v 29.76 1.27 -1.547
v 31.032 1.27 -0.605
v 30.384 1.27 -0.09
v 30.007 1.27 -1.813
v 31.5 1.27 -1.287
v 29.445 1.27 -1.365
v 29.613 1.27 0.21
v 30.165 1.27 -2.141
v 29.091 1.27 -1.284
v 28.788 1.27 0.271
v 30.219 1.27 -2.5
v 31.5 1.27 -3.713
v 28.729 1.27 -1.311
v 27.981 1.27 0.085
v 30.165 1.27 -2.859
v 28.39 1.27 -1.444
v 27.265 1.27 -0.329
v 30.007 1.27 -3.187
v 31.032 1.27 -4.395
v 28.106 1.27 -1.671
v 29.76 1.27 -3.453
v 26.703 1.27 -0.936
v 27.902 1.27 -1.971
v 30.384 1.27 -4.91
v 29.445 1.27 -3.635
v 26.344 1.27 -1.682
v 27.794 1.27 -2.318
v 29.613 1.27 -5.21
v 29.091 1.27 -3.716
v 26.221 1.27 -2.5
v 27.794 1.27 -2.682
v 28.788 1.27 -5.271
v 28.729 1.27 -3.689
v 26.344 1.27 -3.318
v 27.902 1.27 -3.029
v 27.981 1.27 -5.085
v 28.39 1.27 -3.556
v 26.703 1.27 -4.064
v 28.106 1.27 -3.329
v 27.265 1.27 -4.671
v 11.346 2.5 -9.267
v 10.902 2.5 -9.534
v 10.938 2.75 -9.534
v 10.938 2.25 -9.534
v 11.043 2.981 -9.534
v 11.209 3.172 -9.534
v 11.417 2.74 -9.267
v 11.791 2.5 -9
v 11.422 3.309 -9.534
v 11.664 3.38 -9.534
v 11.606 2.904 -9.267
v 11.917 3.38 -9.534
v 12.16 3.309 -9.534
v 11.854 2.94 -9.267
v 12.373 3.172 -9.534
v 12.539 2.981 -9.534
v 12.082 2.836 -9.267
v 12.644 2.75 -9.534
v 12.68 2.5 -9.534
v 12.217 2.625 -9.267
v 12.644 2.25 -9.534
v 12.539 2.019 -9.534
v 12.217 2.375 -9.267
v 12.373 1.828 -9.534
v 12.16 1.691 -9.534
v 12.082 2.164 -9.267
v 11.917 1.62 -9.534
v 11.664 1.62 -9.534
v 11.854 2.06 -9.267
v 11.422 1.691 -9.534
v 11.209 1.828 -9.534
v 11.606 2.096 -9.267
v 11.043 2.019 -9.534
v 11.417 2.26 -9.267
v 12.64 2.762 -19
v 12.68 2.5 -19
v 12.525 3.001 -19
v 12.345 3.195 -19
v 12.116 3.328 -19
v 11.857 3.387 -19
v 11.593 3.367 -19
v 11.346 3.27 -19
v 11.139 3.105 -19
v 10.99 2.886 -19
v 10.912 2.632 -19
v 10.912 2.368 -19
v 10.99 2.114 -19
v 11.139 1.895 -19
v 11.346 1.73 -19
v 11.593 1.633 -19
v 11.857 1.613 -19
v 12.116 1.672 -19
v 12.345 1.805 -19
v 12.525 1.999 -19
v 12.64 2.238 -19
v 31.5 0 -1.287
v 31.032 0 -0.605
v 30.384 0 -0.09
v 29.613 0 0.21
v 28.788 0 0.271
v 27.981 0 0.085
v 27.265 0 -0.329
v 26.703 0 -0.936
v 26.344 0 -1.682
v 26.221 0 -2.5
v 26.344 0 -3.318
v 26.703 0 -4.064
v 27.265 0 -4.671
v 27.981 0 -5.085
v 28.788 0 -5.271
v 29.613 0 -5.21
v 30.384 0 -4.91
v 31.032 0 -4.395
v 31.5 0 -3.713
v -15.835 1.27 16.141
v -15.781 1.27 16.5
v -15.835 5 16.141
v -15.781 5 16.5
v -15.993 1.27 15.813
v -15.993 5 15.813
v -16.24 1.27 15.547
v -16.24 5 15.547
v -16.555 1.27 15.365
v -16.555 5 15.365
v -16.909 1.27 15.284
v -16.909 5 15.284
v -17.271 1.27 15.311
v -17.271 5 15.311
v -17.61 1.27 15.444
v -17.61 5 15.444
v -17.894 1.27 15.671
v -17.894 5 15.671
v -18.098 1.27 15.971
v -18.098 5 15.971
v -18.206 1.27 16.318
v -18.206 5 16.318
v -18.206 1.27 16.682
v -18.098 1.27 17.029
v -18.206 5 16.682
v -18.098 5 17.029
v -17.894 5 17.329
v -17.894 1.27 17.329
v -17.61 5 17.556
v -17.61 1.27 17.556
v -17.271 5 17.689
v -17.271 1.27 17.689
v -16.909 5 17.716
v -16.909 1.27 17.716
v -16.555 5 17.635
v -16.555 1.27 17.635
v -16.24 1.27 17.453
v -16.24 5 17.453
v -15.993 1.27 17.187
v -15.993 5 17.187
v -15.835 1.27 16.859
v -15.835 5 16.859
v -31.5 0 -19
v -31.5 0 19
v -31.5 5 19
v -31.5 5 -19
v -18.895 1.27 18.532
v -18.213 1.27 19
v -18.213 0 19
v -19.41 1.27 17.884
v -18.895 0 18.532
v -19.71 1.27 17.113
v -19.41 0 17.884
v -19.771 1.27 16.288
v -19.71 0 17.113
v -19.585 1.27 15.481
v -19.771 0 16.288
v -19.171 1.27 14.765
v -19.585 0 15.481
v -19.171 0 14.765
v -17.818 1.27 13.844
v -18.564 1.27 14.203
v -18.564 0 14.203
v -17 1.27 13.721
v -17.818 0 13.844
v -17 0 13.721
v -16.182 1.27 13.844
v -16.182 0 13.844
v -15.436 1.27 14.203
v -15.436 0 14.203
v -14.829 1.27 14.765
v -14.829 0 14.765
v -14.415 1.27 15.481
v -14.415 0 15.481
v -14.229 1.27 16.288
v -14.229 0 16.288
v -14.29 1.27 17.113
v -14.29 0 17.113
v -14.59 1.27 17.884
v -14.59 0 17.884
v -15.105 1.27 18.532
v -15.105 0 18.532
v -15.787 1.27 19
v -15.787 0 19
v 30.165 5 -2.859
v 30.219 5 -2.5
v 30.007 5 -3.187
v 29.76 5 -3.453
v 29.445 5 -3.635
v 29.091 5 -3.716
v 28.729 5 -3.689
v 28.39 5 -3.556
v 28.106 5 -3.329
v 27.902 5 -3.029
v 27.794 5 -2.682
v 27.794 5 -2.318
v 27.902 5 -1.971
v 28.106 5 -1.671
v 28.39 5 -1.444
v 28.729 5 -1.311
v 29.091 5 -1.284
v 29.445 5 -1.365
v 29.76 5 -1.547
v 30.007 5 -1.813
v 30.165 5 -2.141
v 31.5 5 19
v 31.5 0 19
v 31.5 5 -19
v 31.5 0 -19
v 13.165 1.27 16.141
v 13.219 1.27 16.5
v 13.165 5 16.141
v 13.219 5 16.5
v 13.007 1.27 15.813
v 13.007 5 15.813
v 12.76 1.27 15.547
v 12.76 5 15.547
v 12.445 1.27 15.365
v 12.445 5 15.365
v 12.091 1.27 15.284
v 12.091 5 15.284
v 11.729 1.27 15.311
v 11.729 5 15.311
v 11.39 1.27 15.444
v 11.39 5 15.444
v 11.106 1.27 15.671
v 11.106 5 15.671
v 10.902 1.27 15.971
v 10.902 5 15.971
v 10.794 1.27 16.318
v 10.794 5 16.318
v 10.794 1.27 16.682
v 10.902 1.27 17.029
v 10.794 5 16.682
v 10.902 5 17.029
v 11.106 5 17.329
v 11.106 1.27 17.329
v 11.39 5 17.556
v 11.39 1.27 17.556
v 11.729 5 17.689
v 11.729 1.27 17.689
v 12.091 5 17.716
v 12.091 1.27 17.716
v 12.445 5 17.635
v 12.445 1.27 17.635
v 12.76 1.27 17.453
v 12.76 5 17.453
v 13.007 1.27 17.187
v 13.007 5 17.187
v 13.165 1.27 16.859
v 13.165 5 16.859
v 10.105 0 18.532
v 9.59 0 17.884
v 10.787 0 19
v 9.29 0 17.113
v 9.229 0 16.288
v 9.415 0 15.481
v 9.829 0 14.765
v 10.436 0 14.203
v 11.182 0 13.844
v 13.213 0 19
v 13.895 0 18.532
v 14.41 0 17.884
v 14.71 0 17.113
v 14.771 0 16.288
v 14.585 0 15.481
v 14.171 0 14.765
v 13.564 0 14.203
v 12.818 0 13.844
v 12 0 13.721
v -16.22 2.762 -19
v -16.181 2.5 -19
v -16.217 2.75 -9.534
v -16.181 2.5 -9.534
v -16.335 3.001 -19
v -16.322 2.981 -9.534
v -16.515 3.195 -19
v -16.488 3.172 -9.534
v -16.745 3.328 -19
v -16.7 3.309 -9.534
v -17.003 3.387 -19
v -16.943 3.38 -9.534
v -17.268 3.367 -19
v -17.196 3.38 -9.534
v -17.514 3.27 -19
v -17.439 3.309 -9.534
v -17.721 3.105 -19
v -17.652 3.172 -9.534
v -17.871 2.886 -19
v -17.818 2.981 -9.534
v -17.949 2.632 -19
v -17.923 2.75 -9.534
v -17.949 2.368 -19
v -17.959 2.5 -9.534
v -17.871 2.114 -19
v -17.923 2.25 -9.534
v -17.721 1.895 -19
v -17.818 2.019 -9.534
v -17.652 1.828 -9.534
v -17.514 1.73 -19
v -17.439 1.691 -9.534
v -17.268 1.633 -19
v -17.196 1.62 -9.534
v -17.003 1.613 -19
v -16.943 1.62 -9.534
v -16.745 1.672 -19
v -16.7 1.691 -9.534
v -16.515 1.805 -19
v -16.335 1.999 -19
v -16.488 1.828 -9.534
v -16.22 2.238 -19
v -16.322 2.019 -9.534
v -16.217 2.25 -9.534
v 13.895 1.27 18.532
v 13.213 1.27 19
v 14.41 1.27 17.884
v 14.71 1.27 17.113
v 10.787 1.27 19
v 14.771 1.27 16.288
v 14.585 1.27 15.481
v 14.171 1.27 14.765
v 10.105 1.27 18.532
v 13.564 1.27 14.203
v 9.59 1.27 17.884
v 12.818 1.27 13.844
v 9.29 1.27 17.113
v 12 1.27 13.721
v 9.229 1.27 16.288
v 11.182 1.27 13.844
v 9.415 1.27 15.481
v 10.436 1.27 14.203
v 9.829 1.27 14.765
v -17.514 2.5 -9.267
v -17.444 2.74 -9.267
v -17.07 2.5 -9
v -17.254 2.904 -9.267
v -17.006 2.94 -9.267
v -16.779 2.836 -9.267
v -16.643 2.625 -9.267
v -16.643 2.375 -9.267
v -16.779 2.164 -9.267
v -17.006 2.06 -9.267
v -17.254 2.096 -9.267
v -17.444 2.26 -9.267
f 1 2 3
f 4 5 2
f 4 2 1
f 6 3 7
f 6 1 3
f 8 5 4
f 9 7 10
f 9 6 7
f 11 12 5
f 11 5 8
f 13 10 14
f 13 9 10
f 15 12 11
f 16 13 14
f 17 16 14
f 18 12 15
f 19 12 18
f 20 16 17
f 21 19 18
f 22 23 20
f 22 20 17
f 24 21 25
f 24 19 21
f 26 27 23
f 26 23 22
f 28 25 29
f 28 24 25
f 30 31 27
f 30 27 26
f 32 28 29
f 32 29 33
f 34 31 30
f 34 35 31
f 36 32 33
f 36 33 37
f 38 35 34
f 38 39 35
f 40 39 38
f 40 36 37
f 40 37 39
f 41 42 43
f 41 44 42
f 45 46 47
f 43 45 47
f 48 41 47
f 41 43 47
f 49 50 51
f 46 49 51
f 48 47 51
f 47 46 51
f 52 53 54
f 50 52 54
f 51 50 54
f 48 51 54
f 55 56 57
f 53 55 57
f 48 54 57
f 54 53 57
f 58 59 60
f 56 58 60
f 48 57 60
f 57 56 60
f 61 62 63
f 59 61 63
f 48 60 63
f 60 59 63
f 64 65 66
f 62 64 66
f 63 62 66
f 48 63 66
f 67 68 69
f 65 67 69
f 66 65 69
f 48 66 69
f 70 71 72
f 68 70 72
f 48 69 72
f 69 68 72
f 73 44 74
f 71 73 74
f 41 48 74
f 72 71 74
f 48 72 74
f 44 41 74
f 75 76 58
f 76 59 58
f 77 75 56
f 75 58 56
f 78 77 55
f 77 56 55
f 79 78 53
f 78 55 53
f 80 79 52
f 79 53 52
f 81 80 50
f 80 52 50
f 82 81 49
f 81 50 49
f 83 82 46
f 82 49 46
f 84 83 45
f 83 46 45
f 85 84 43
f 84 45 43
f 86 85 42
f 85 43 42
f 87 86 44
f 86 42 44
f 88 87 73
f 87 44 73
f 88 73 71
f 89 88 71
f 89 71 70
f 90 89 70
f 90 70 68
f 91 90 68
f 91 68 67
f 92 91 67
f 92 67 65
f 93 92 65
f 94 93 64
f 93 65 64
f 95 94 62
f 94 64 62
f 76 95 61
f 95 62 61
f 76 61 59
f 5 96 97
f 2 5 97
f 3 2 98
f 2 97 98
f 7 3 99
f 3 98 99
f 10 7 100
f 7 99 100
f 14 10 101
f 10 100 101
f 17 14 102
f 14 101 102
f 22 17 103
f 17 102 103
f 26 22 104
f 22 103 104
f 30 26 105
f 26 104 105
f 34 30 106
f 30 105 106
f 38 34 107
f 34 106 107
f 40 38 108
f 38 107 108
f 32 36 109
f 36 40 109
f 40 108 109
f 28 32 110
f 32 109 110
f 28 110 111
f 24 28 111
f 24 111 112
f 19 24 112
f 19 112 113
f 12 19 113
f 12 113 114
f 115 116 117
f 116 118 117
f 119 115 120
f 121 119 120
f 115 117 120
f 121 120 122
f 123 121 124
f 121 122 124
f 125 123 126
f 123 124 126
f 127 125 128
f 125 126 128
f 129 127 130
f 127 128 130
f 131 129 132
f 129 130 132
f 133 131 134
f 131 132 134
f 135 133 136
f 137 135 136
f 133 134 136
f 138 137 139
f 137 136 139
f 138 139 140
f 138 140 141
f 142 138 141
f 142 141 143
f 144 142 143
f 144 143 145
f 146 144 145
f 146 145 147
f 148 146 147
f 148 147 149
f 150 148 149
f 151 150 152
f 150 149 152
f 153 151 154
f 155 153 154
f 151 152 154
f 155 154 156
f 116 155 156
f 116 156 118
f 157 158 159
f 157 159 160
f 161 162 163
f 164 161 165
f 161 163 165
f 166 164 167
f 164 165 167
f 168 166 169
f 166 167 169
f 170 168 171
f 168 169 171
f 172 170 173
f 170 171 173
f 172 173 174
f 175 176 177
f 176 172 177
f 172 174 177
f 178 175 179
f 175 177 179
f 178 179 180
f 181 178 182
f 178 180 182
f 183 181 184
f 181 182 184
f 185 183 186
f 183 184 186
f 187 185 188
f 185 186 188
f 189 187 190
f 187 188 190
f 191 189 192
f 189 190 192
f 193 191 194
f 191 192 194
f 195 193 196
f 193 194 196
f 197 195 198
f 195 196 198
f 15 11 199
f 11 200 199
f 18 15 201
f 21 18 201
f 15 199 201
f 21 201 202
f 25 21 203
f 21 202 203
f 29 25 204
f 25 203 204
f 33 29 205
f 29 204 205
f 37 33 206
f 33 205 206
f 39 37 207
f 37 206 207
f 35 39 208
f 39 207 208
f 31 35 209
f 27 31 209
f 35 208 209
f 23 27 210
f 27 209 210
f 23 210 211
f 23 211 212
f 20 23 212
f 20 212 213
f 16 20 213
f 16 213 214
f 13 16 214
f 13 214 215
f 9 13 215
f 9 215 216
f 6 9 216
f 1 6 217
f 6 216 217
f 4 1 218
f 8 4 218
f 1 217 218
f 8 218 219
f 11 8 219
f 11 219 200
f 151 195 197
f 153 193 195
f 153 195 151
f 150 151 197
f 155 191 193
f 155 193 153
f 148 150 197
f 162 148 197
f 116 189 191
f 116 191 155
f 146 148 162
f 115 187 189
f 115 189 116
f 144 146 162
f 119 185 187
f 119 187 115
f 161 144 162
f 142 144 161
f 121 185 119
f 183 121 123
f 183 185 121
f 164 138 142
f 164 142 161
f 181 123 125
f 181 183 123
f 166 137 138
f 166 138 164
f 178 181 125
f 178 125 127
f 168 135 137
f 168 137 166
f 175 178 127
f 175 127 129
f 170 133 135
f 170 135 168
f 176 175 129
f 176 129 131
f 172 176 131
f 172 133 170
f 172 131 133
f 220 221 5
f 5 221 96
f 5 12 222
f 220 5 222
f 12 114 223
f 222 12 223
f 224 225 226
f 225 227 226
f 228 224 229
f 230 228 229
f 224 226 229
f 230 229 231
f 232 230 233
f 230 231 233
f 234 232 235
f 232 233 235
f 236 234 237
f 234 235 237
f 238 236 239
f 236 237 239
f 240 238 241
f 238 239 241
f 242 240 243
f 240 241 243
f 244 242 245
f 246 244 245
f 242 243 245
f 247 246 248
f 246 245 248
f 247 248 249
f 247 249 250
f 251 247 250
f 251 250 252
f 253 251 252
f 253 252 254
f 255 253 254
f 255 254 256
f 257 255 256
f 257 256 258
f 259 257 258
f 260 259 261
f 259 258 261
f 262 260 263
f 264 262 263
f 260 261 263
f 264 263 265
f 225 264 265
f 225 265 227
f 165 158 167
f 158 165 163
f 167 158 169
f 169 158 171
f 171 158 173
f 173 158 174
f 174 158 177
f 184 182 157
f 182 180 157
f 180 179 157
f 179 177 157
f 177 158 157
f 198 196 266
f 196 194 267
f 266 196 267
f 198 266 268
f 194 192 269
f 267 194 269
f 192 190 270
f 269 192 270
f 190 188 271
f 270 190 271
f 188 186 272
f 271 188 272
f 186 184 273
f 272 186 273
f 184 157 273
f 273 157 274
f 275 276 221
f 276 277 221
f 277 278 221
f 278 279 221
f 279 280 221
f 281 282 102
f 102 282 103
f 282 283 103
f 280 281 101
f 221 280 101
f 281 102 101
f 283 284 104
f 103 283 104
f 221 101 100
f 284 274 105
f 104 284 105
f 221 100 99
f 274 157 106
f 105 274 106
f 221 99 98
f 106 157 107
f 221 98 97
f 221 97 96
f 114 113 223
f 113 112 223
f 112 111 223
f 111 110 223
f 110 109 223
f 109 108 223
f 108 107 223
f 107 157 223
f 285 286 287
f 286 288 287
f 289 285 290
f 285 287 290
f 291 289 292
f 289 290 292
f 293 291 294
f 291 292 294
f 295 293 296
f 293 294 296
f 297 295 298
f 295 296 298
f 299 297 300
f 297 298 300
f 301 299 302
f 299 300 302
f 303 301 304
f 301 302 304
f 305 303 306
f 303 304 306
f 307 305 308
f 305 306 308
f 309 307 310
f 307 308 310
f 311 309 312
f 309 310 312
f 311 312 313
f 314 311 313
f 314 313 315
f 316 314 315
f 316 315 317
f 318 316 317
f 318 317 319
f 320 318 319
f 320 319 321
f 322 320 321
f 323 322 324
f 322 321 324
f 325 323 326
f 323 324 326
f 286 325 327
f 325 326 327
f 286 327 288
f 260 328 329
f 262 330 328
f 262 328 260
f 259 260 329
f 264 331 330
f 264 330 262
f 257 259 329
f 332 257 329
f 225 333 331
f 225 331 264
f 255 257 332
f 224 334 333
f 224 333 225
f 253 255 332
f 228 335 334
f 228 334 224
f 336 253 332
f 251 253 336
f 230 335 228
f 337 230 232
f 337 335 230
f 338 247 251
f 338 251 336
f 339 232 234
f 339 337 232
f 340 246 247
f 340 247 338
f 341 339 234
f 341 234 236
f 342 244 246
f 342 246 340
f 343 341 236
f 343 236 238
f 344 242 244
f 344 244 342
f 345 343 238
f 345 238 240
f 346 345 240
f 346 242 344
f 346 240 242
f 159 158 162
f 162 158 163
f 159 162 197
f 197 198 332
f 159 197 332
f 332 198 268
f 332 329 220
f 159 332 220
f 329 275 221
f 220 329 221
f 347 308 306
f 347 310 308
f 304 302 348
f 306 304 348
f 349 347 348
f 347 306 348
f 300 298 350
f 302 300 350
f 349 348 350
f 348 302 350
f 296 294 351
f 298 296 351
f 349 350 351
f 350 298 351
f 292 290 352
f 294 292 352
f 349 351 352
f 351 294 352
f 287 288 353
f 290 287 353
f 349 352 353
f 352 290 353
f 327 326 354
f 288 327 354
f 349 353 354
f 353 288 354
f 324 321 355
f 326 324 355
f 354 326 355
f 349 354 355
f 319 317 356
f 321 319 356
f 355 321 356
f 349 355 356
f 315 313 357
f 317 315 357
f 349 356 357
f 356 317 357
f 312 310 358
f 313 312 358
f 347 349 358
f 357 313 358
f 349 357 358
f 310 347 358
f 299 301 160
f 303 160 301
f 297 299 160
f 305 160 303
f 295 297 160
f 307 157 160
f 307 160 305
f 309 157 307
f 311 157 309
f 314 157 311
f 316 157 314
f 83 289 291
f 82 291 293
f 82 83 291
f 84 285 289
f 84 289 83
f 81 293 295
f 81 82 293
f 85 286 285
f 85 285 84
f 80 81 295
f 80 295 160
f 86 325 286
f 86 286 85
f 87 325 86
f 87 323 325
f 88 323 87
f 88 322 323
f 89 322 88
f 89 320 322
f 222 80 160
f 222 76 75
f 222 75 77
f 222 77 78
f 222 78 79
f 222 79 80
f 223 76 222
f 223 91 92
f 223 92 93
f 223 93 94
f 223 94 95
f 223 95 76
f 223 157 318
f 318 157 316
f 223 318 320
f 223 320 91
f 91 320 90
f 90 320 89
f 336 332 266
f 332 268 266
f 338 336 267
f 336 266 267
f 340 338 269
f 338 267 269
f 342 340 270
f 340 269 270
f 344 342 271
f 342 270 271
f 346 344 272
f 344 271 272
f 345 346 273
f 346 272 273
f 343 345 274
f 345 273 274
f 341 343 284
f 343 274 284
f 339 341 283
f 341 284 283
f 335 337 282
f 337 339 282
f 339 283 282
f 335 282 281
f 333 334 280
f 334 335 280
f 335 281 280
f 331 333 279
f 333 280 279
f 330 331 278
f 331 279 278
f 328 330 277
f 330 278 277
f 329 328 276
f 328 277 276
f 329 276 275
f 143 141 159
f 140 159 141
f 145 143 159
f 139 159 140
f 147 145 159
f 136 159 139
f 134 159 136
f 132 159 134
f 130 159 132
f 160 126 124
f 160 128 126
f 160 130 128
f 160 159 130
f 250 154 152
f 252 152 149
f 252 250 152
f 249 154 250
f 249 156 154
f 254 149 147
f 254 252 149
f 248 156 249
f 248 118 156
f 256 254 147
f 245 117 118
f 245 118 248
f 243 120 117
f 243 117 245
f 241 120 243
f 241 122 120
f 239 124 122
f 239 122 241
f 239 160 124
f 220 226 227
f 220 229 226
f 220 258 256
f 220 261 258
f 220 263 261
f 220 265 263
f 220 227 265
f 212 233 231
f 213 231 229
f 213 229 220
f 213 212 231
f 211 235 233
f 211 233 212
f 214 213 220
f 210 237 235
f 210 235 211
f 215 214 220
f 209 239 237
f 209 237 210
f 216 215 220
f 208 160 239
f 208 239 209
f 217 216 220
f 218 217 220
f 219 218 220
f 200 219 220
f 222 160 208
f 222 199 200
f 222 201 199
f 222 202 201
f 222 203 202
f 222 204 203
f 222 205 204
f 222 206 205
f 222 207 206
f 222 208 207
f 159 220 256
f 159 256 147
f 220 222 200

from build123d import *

# Parameters (mm, degrees)
SKETCH1_W                                           = 63
SKETCH1_H                                           = 38
BOSS_EXTRUDE1_DEPTH                                 = 5
CBORE_FOR_2_BINDING_HEAD_MACHINE_SCREW2_D           = 2.4384
CBORE_FOR_2_BINDING_HEAD_MACHINE_SCREW2_CBORE_D     = 5.55752
CBORE_FOR_2_BINDING_HEAD_MACHINE_SCREW2_CBORE_DEPTH = 1.27
CBORE_FOR_2_BINDING_HEAD_MACHINE_SCREW3_D           = 2.4384
CBORE_FOR_2_BINDING_HEAD_MACHINE_SCREW3_CBORE_D     = 5.55752
CBORE_FOR_2_BINDING_HEAD_MACHINE_SCREW3_CBORE_DEPTH = 1.27
F_2_56_TAPPED_HOLE1_D                               = 1.778
F_2_56_TAPPED_HOLE1_DEPTH                           = 9.46583491
F_2_56_TAPPED_HOLE1_TIP                             = 0.53416509


with BuildPart() as part:
    # Sketch1 → Boss-Extrude1 (new body)
    with BuildSketch(Plane(origin=(0, 0, 0), x_dir=(1, 0, 0), z_dir=(0, 1, 0))):
        Rectangle(SKETCH1_W, SKETCH1_H)
    extrude(amount=BOSS_EXTRUDE1_DEPTH)

    # CBORE for #2 Binding Head Machine Screw2 (through all)
    with Locations(Plane(origin=(0, 0, 0), x_dir=(-1, 0, 0), z_dir=(0, -1, 0))):
        with Locations((-29, 2.5)):
            CounterBoreHole(CBORE_FOR_2_BINDING_HEAD_MACHINE_SCREW2_D / 2, CBORE_FOR_2_BINDING_HEAD_MACHINE_SCREW2_CBORE_D / 2, CBORE_FOR_2_BINDING_HEAD_MACHINE_SCREW2_CBORE_DEPTH)

    # CBORE for #2 Binding Head Machine Screw3 (through all)
    with Locations(Plane(origin=(0, 0, 0), x_dir=(-1, 0, 0), z_dir=(0, -1, 0))):
        with Locations((-12, -16.5), (17, -16.5)):
            CounterBoreHole(CBORE_FOR_2_BINDING_HEAD_MACHINE_SCREW3_D / 2, CBORE_FOR_2_BINDING_HEAD_MACHINE_SCREW3_CBORE_D / 2, CBORE_FOR_2_BINDING_HEAD_MACHINE_SCREW3_CBORE_DEPTH)

    # #2-56 Tapped Hole1
    with Locations(Plane(origin=(0, 0, -19), x_dir=(-1, 0, 0), z_dir=(0, 0, -1))):
        with Locations((-11.79093, 2.5), (17.06969, 2.5)):
            Hole(F_2_56_TAPPED_HOLE1_D / 2, depth=F_2_56_TAPPED_HOLE1_DEPTH)
            with Locations((0, 0, -(F_2_56_TAPPED_HOLE1_DEPTH + F_2_56_TAPPED_HOLE1_TIP / 2))):  # 118° drill point
                Cone(0, F_2_56_TAPPED_HOLE1_D / 2, F_2_56_TAPPED_HOLE1_TIP, mode=Mode.SUBTRACT)


solid = part.part
